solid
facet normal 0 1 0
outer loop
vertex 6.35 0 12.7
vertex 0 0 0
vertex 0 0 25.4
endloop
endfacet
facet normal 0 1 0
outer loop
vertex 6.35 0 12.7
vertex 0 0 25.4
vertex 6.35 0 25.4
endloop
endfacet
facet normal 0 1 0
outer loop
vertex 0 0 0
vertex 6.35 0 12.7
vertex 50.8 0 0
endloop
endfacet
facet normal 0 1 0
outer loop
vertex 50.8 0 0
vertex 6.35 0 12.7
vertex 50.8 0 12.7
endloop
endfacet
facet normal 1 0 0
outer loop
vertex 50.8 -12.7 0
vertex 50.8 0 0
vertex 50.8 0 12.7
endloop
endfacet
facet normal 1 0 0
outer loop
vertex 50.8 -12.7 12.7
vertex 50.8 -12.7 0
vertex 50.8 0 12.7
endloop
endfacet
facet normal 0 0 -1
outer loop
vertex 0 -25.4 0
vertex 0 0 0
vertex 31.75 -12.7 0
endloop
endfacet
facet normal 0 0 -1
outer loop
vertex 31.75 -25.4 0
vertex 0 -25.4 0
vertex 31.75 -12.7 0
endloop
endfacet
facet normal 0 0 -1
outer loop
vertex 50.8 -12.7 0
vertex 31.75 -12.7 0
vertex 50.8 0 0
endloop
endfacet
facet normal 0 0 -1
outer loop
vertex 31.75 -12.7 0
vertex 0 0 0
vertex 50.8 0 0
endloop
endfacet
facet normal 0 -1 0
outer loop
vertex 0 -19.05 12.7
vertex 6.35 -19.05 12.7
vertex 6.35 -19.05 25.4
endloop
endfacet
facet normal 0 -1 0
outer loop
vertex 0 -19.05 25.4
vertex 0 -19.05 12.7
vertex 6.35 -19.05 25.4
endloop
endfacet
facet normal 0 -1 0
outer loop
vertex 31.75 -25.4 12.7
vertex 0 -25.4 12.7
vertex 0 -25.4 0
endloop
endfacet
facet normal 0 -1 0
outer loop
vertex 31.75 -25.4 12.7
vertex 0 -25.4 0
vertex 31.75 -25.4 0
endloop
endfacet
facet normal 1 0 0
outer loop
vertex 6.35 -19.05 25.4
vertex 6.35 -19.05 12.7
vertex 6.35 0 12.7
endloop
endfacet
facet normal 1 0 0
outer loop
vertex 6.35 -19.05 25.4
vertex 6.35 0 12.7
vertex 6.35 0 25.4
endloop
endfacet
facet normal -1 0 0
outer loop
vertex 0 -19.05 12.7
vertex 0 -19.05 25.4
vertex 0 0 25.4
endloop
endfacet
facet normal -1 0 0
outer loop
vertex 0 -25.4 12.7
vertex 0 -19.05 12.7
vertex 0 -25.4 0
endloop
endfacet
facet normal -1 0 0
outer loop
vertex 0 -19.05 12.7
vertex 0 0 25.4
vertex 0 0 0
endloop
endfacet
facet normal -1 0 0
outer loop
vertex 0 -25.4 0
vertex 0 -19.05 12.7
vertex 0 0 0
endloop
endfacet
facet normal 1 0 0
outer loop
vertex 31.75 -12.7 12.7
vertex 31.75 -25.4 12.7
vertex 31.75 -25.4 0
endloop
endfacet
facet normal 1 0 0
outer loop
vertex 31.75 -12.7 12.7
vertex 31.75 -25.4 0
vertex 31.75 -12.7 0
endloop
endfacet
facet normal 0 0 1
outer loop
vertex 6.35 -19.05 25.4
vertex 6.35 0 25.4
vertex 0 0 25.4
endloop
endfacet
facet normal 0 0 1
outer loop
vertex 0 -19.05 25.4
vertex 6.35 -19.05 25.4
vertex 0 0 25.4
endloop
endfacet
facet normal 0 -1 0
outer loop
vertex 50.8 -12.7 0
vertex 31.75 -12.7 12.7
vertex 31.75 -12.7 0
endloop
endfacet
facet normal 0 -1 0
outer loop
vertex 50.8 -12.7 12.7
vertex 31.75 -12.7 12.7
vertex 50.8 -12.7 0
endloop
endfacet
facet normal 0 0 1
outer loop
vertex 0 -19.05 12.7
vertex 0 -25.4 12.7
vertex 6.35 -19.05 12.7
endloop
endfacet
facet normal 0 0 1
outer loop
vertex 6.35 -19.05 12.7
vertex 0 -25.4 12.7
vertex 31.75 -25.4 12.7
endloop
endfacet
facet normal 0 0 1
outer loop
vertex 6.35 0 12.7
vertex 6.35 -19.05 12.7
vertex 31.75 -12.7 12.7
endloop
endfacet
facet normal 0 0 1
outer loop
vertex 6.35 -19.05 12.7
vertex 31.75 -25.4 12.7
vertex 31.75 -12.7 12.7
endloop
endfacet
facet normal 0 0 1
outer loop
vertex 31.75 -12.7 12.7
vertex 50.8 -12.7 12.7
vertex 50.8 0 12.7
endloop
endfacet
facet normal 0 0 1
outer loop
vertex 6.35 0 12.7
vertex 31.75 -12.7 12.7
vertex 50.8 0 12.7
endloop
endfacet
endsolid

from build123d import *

# Parameters (mm, degrees)
F1_DEPTH = 25.4
F2_W     = 6.35
F2_H     = 12.7
F3_DEPTH = 6.351
F4_W     = 19.05
F4_H     = 12.7
F5_DEPTH = 12.701


with BuildPart() as f1:
    # F0 (on Front) → F1 (new body)
    with BuildSketch(Plane.XZ):
        Polygon((0, 25.4), (0, 0), (50.8, 0), (50.8, 12.7), (6.35, 12.7), (6.35, 25.4), align=None)
    extrude(amount=F1_DEPTH)

    # F2 (on face) → F3 (cut, through all)
    with BuildSketch(Plane.YZ.offset(6.35)):
        with Locations((-22.225, 19.05)):
            Rectangle(F2_W, F2_H)
    extrude(amount=-F3_DEPTH, mode=Mode.SUBTRACT)

    # F4 (on face) → F5 (cut, through all)
    with BuildSketch(Plane.XY.offset(12.7)):
        with Locations((41.275, -19.05)):
            Rectangle(F4_W, F4_H)
    extrude(amount=-F5_DEPTH, mode=Mode.SUBTRACT)


solid = f1.part
